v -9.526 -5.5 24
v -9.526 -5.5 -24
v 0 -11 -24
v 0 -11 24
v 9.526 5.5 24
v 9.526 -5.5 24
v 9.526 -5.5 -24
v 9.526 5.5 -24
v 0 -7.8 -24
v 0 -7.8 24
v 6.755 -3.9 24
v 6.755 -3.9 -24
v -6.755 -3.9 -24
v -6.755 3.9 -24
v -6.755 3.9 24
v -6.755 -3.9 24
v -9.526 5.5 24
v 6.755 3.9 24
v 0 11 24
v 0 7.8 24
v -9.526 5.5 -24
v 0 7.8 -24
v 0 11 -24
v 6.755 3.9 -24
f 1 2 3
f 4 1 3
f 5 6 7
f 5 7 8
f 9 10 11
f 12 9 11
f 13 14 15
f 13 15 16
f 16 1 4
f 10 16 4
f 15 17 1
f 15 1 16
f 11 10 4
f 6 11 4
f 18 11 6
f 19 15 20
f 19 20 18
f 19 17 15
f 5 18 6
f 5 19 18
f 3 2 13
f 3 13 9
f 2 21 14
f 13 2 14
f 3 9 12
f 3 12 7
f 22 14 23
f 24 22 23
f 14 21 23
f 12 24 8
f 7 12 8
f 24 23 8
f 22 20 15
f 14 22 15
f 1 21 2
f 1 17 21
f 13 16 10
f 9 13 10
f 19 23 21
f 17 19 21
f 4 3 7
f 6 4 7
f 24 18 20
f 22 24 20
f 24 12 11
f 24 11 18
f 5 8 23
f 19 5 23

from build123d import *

# Parameters (mm, degrees)
BOSS_EXTRUDE2_DEPTH     = 24
CUT_EXTRUDE3_DEPTH      = 25
CUT_EXTRUDE3_DEPTH_BACK = 25


with BuildPart() as part:
    # Sketch1<3> → Boss-Extrude2 (new body, symmetric)
    with BuildSketch(Plane.XY):
        Polygon((0, -11), (9.526279442, -5.5), (9.526279442, 5.5), (0, 11), (-9.526279442, 5.5), (-9.526279442, -5.5), align=None)
    extrude(amount=BOSS_EXTRUDE2_DEPTH, both=True)

    # Sketch2 → Cut-Extrude3 (cut, two sides)
    with BuildSketch(Plane.XY) as cut_extrude3_sk:
        Polygon((0, -7.8), (6.75499815, -3.9), (6.75499815, 3.9), (0, 7.8), (-6.75499815, 3.9), (-6.75499815, -3.9), align=None)
    extrude(amount=CUT_EXTRUDE3_DEPTH, mode=Mode.SUBTRACT)
    extrude(cut_extrude3_sk.sketch, amount=-CUT_EXTRUDE3_DEPTH_BACK, mode=Mode.SUBTRACT)


solid = part.part
